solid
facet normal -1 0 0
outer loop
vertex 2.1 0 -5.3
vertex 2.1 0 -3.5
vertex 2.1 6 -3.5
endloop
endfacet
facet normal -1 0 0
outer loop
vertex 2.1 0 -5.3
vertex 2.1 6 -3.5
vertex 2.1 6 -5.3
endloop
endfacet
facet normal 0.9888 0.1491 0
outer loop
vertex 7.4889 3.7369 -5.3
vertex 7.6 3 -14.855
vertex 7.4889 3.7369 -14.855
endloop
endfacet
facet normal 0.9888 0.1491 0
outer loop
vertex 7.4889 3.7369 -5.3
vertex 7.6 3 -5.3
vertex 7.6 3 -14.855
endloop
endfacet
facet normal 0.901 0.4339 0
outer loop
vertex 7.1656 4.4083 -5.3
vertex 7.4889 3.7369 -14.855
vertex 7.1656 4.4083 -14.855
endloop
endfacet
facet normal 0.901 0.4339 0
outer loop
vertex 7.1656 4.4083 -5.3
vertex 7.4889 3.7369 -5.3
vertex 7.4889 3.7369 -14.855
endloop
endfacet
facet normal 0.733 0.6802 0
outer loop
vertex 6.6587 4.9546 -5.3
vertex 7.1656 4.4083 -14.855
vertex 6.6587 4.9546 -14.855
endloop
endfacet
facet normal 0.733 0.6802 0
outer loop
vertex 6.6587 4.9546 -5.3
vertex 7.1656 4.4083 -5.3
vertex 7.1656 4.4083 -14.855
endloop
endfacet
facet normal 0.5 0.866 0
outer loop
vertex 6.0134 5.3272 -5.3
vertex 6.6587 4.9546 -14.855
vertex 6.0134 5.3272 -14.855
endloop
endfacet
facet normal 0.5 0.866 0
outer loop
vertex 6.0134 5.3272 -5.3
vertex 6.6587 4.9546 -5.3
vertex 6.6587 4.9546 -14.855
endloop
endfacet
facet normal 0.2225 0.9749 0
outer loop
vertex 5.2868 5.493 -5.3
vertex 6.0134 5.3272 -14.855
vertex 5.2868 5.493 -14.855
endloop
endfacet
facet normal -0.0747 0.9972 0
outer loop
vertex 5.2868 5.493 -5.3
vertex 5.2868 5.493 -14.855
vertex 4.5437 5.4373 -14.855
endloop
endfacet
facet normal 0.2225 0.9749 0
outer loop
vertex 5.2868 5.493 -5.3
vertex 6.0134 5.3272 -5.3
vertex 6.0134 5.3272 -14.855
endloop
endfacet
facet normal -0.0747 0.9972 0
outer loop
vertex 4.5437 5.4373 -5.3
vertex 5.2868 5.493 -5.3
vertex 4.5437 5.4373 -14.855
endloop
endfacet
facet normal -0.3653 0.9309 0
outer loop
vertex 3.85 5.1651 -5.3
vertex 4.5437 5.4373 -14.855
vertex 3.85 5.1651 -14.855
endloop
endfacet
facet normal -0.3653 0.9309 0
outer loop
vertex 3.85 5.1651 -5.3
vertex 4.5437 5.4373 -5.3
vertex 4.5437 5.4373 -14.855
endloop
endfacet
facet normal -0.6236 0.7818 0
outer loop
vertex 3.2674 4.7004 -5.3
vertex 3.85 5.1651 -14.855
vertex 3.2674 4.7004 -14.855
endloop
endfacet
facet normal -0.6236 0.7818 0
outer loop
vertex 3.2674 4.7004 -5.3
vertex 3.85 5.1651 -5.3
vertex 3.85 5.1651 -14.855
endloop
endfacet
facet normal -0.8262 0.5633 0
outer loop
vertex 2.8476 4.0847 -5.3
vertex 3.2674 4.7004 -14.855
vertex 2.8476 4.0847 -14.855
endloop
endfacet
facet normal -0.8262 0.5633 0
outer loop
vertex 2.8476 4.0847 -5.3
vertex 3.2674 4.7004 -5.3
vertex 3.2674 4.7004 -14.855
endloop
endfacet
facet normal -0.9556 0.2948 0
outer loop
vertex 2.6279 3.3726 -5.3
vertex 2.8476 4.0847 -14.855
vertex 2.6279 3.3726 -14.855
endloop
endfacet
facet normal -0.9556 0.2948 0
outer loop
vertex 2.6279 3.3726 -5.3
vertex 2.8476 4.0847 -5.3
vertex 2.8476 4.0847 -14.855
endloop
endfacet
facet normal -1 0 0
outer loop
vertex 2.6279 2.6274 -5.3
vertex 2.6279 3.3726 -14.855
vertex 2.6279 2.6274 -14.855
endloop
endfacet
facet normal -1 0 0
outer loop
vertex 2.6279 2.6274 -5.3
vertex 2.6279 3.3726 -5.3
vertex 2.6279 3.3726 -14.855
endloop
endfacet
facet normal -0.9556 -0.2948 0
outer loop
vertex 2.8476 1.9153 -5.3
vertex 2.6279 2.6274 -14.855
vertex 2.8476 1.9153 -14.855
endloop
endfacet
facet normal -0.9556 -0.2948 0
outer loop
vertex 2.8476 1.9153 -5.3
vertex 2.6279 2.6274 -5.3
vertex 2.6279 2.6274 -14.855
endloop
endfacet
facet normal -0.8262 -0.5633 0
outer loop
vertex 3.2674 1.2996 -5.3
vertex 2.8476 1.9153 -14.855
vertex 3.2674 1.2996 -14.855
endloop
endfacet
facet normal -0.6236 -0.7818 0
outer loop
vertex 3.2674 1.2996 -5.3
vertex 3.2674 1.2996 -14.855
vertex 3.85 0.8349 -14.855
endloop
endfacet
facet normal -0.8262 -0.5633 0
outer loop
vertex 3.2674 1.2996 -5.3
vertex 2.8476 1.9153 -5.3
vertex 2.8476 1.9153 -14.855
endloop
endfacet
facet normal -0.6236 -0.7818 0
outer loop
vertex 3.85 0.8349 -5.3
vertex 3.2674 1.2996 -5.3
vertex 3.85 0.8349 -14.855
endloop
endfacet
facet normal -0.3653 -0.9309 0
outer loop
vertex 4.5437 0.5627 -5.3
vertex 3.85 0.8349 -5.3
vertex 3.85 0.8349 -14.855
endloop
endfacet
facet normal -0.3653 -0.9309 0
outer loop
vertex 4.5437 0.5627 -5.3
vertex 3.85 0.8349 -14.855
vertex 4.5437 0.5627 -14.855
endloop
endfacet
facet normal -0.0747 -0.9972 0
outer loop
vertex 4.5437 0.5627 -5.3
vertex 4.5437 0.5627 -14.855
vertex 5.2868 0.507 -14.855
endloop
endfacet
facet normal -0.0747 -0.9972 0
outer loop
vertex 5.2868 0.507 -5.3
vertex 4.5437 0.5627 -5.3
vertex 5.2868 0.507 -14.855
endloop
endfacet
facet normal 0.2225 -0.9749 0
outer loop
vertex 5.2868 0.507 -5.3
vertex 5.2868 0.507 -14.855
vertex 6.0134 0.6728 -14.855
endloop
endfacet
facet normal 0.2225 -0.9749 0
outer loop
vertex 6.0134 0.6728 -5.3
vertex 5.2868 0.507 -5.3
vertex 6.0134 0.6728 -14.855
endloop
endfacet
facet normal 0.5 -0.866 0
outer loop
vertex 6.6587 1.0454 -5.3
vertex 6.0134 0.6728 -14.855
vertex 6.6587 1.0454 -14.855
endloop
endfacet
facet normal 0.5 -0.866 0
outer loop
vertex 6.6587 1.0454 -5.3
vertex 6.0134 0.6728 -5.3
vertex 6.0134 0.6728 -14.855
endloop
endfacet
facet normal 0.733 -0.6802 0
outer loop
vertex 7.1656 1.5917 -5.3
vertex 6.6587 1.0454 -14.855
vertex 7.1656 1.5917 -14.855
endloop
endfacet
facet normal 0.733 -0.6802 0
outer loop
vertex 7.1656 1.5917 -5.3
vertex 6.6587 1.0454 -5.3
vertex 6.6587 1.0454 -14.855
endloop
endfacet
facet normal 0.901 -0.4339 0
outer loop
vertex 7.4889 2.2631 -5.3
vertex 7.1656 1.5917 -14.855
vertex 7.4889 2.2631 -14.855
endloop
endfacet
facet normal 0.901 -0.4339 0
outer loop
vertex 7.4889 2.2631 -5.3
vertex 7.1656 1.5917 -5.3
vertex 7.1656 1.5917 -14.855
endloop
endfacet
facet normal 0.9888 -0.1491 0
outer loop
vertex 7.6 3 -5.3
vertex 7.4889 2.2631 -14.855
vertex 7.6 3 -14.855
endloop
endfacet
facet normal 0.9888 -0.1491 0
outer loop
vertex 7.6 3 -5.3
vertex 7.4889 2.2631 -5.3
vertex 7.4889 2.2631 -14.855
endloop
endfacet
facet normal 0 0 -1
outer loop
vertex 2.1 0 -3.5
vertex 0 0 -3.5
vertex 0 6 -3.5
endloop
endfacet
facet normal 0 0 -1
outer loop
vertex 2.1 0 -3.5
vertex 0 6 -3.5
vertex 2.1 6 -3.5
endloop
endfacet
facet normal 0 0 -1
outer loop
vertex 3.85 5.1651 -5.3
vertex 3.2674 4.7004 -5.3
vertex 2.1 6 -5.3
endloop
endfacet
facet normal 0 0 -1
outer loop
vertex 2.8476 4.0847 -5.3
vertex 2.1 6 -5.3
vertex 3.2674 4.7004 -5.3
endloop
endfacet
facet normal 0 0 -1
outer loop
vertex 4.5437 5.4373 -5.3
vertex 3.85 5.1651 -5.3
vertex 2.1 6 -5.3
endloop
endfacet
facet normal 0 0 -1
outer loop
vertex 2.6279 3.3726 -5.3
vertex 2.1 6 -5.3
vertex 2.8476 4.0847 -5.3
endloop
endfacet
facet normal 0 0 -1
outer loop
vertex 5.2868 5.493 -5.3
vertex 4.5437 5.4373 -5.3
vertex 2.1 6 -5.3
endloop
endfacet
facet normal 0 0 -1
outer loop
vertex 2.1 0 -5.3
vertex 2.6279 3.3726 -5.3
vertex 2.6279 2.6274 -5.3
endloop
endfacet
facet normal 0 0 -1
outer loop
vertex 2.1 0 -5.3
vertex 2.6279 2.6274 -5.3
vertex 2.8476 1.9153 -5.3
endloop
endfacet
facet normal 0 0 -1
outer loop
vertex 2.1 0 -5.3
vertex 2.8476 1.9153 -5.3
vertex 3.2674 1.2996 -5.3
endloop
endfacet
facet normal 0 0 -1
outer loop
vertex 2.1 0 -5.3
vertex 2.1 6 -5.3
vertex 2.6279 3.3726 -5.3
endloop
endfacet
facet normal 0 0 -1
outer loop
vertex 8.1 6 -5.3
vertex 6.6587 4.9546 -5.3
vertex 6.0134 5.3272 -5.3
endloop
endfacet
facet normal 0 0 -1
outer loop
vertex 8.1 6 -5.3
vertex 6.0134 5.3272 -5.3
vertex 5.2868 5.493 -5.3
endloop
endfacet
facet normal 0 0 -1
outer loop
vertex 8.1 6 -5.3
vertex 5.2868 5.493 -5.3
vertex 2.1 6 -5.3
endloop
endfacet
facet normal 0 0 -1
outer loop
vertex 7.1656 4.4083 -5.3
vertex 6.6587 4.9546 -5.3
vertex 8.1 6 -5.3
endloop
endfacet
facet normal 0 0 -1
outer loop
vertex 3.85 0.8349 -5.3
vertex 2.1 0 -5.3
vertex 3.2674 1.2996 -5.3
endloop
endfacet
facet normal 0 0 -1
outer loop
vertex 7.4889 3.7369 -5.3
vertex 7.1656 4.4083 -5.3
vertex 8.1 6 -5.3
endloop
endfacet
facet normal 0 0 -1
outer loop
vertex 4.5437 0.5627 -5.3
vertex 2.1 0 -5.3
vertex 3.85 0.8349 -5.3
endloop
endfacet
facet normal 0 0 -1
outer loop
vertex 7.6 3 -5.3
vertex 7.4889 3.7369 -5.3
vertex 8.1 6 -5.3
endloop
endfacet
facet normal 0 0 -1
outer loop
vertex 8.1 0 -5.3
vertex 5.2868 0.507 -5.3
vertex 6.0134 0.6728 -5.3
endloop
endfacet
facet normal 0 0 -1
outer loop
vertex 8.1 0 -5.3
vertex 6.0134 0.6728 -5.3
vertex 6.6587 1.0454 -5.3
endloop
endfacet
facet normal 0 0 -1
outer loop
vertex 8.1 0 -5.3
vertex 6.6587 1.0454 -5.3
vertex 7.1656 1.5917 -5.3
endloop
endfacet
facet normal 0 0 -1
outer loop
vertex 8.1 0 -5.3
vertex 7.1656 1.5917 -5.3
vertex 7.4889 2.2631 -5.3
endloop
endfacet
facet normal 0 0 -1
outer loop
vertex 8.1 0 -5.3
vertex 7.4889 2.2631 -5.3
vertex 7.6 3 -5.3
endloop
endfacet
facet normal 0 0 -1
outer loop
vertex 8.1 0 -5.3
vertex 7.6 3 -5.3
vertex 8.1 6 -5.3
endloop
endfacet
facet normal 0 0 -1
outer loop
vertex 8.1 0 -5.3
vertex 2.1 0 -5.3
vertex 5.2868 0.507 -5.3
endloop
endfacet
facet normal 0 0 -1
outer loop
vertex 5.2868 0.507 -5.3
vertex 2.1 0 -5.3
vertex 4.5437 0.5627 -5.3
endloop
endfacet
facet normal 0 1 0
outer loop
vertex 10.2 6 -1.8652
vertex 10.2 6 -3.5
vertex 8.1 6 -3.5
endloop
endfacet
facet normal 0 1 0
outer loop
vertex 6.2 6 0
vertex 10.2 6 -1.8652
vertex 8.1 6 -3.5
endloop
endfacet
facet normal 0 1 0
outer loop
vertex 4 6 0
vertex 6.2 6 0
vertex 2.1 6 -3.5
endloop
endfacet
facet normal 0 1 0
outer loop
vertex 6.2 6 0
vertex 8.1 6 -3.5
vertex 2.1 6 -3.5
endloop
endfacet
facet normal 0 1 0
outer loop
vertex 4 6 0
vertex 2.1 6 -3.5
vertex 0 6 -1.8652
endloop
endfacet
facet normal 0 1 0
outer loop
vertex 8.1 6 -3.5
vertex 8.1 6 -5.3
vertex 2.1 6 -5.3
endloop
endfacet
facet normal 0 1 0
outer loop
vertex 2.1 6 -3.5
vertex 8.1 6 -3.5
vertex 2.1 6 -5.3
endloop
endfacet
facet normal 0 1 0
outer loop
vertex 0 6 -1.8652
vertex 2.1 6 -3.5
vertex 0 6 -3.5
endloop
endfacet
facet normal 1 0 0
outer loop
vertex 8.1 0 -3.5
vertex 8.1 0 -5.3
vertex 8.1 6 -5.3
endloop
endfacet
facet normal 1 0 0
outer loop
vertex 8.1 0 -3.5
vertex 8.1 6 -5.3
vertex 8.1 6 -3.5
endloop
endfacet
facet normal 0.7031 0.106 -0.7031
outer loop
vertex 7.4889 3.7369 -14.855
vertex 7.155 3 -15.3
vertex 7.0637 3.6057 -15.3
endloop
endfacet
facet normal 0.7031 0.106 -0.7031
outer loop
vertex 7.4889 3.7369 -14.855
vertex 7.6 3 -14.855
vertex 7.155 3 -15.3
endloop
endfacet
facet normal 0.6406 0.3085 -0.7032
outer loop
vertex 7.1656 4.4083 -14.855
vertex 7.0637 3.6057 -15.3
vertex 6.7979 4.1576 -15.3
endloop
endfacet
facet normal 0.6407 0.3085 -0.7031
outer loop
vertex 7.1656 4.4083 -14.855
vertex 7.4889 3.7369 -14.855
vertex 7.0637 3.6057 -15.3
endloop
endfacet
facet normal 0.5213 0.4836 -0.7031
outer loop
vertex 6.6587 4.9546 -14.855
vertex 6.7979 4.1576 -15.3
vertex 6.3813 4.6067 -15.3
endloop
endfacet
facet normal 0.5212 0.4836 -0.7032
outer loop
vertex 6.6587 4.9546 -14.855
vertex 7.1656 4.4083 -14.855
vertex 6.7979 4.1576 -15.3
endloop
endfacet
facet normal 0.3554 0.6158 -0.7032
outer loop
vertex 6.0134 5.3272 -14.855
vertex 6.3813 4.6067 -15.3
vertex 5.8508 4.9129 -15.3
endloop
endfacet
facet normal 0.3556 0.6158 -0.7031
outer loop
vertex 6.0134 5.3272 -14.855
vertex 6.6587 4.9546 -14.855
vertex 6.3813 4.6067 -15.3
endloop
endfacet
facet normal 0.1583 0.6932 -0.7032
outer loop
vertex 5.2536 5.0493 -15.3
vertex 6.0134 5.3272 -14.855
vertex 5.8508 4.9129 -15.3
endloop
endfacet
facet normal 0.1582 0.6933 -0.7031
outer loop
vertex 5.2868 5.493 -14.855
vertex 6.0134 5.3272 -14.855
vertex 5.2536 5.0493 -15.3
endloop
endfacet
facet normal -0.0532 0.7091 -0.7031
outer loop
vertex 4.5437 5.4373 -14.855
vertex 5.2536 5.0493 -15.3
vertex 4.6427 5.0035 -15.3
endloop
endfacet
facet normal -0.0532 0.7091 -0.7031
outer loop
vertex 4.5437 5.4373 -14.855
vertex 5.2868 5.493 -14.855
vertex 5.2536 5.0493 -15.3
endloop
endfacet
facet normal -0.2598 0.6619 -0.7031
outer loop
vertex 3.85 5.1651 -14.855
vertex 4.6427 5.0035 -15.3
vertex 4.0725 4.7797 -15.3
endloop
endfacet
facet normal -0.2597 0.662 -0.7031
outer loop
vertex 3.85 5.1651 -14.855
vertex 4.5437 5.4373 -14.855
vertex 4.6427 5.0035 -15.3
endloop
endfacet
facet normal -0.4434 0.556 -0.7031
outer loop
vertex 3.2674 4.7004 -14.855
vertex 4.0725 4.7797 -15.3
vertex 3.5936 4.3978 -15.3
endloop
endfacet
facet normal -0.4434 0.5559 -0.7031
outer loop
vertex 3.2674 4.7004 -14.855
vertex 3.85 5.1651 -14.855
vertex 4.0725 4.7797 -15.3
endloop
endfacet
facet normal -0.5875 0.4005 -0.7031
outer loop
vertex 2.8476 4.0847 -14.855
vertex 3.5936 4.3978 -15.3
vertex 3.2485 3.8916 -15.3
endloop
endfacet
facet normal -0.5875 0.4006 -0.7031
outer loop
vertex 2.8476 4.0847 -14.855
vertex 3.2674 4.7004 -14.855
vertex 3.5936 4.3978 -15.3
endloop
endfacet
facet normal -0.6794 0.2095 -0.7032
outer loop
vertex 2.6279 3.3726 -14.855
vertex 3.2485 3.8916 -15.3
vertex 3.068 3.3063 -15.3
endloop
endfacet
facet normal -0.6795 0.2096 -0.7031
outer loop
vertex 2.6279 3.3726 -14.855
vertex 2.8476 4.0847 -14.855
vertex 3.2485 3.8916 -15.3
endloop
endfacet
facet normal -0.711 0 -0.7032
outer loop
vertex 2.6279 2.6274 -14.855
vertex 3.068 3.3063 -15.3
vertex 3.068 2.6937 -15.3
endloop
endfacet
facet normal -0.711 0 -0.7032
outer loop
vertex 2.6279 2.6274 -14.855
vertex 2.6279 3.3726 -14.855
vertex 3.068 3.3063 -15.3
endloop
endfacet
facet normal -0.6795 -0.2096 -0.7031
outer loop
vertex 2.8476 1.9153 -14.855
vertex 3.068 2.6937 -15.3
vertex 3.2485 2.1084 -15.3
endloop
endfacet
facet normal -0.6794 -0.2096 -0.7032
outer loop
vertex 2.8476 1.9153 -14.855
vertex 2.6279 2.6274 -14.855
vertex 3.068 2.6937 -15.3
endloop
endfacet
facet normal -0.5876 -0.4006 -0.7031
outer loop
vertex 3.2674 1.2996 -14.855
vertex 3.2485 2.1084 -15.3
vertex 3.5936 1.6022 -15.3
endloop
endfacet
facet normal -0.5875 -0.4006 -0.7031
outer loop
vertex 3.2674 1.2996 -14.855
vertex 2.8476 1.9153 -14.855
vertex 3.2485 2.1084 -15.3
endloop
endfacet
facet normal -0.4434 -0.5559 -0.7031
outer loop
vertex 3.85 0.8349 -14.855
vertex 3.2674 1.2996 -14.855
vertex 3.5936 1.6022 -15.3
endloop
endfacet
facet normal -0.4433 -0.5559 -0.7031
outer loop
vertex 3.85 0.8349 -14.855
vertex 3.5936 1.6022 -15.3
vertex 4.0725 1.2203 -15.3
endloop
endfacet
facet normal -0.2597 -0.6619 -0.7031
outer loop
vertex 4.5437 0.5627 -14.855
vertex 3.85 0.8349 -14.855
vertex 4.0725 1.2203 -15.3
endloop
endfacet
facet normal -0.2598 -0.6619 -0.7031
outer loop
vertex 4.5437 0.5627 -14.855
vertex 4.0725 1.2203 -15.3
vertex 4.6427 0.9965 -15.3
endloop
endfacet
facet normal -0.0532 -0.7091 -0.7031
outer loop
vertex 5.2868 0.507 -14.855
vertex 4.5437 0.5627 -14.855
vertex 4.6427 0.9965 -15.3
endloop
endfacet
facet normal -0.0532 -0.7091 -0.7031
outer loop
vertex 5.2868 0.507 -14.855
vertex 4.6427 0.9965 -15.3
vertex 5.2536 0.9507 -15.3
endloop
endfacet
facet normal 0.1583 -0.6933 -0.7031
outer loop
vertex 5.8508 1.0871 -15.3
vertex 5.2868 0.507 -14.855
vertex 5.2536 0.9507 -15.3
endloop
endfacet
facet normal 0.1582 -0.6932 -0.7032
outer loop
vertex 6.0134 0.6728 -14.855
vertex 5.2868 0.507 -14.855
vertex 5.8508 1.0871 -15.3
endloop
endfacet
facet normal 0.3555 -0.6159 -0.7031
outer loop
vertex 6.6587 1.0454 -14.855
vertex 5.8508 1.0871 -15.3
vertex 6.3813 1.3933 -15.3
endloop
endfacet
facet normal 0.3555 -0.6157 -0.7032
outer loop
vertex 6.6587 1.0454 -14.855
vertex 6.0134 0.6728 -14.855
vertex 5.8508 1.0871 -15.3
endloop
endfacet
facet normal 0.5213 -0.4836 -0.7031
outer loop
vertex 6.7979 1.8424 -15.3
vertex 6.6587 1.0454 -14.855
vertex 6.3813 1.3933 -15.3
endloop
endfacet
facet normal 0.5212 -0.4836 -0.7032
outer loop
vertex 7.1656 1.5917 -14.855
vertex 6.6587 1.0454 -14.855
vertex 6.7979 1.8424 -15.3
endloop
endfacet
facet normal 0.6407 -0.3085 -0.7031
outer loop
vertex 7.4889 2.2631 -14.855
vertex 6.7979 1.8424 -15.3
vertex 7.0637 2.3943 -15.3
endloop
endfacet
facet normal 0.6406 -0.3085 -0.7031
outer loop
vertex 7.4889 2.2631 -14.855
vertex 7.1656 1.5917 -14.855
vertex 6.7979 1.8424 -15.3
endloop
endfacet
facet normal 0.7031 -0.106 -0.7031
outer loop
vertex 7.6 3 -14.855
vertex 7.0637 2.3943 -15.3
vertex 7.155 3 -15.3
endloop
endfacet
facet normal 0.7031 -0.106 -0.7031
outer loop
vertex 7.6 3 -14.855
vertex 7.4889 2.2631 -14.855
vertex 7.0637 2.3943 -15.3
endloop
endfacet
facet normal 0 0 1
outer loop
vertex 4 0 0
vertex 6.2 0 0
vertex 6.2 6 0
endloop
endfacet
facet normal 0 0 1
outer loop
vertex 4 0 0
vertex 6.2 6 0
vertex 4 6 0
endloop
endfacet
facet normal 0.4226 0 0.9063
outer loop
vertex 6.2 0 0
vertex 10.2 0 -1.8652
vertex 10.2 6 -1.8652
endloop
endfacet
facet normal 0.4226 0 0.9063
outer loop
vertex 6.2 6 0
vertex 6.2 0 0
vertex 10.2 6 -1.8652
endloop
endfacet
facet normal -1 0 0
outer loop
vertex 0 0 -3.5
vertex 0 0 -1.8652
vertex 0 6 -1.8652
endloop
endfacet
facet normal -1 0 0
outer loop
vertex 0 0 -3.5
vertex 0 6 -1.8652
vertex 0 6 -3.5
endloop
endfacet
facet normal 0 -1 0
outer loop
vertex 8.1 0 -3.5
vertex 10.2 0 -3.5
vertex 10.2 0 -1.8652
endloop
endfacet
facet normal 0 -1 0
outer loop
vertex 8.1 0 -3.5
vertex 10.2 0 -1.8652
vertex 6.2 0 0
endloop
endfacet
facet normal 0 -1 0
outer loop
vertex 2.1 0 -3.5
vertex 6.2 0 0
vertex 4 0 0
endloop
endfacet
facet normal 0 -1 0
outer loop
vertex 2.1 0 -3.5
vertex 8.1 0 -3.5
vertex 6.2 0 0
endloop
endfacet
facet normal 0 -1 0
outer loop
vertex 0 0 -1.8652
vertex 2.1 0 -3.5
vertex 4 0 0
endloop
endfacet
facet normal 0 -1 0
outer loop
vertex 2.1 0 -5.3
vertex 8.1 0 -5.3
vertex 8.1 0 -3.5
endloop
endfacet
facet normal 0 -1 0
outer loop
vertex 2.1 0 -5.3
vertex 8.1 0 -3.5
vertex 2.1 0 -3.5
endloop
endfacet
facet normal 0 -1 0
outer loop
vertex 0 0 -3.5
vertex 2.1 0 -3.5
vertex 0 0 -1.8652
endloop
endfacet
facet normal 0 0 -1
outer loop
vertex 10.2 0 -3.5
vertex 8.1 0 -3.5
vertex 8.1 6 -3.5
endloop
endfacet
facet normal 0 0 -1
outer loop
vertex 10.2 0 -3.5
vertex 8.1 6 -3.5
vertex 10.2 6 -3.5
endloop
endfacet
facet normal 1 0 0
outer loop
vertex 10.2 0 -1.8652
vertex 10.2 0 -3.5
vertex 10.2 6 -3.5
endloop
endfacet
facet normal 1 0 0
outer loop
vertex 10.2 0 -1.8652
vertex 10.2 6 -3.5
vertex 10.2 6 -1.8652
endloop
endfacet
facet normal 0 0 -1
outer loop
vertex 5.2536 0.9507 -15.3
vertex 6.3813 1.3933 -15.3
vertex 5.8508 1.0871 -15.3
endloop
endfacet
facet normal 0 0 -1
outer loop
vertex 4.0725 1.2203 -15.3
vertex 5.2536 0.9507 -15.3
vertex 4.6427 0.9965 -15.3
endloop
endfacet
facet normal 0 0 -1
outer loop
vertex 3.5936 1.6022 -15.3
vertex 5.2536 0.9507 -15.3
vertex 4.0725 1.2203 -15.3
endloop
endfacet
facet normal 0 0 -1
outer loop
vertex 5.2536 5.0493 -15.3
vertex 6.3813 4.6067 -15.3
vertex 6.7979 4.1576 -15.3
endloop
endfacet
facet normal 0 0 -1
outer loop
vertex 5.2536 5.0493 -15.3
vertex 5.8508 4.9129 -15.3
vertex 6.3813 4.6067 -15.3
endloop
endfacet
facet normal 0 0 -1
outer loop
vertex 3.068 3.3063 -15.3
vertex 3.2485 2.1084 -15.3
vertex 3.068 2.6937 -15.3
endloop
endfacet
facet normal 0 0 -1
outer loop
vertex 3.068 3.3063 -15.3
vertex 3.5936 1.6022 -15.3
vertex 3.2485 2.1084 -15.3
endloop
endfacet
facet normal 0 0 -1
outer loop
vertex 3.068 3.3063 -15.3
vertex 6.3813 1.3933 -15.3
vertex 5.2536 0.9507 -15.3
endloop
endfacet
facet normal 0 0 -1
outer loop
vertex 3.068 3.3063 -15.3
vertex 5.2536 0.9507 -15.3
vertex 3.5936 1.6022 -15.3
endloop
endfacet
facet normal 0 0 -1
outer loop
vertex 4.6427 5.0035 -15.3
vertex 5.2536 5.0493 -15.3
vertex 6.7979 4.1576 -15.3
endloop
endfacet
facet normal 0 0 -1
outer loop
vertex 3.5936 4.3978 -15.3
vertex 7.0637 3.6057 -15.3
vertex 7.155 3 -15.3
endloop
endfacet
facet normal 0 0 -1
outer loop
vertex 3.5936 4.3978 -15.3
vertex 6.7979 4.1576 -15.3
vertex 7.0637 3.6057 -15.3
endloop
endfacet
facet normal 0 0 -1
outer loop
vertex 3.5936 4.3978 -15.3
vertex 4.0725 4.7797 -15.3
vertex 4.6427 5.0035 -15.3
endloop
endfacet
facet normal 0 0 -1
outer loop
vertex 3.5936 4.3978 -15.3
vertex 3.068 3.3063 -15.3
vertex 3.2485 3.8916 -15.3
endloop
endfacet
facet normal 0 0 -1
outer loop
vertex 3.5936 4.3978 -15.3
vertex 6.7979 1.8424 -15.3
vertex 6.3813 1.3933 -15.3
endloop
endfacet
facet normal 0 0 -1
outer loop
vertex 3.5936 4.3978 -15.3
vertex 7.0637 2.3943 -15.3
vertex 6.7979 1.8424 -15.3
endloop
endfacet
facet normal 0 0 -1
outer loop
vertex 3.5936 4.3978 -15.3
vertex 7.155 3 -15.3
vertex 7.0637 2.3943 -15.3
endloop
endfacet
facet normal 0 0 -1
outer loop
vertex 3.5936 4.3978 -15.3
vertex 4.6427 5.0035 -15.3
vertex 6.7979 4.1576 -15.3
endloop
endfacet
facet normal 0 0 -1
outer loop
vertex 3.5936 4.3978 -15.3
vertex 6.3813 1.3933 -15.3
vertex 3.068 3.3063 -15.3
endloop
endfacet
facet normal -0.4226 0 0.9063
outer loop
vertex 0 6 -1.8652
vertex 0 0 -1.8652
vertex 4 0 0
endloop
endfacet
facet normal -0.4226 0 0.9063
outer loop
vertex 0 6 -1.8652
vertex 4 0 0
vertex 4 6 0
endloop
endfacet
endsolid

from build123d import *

# Parameters (mm, degrees)
BOSS_EXTRUDE1_DEPTH = 6
CHAMFER1_SIZE       = 4
CHAMFER1_SIZE2      = 1.865230633


# Read off the part's stored shape, not the designer's step: M5x0.8 Machine Threads Stud1
with BuildPart() as part:
    # Sketch1 → Boss-Extrude1 (new body)
    with BuildSketch(Plane(origin=(0, 0, 0), x_dir=(1, 0, 0), z_dir=(0, 1, 0))):
        Polygon((0, 0), (0, 3.5), (2.1, 3.5), (2.1, 5.3), (8.1, 5.3), (8.1, 3.5), (10.2, 3.5), (10.2, 0), align=None)
    extrude(amount=BOSS_EXTRUDE1_DEPTH)

    # M5x0.8 Machine Threads Stud1 outline → M5x0.8 Machine Threads Stud1 (revolve)
    with BuildSketch(Plane(origin=(5.1, 3, 0), x_dir=(1, 0, 0), z_dir=(0, -1, 0))):
        Polygon((0, -5.3), (0, -15.3), (2.055, -15.3), (2.5, -14.855), (2.5, -5.3), align=None)
    revolve(axis=Axis((5.1, 3, 0), (0, 0, 1)))

    # Chamfer1
    chamfer1_edges = [part.edges().sort_by_distance(p)[0] for p in [
        (0, 3, 0),
        (10.2, 3, 0),
    ]]
    chamfer1_side = [part.faces().sort_by_distance(p)[0] for p in [
        (5.1, 3, 0),
    ]]
    chamfer(chamfer1_edges, length=CHAMFER1_SIZE, length2=CHAMFER1_SIZE2, reference=chamfer1_side[0])


solid = part.part
